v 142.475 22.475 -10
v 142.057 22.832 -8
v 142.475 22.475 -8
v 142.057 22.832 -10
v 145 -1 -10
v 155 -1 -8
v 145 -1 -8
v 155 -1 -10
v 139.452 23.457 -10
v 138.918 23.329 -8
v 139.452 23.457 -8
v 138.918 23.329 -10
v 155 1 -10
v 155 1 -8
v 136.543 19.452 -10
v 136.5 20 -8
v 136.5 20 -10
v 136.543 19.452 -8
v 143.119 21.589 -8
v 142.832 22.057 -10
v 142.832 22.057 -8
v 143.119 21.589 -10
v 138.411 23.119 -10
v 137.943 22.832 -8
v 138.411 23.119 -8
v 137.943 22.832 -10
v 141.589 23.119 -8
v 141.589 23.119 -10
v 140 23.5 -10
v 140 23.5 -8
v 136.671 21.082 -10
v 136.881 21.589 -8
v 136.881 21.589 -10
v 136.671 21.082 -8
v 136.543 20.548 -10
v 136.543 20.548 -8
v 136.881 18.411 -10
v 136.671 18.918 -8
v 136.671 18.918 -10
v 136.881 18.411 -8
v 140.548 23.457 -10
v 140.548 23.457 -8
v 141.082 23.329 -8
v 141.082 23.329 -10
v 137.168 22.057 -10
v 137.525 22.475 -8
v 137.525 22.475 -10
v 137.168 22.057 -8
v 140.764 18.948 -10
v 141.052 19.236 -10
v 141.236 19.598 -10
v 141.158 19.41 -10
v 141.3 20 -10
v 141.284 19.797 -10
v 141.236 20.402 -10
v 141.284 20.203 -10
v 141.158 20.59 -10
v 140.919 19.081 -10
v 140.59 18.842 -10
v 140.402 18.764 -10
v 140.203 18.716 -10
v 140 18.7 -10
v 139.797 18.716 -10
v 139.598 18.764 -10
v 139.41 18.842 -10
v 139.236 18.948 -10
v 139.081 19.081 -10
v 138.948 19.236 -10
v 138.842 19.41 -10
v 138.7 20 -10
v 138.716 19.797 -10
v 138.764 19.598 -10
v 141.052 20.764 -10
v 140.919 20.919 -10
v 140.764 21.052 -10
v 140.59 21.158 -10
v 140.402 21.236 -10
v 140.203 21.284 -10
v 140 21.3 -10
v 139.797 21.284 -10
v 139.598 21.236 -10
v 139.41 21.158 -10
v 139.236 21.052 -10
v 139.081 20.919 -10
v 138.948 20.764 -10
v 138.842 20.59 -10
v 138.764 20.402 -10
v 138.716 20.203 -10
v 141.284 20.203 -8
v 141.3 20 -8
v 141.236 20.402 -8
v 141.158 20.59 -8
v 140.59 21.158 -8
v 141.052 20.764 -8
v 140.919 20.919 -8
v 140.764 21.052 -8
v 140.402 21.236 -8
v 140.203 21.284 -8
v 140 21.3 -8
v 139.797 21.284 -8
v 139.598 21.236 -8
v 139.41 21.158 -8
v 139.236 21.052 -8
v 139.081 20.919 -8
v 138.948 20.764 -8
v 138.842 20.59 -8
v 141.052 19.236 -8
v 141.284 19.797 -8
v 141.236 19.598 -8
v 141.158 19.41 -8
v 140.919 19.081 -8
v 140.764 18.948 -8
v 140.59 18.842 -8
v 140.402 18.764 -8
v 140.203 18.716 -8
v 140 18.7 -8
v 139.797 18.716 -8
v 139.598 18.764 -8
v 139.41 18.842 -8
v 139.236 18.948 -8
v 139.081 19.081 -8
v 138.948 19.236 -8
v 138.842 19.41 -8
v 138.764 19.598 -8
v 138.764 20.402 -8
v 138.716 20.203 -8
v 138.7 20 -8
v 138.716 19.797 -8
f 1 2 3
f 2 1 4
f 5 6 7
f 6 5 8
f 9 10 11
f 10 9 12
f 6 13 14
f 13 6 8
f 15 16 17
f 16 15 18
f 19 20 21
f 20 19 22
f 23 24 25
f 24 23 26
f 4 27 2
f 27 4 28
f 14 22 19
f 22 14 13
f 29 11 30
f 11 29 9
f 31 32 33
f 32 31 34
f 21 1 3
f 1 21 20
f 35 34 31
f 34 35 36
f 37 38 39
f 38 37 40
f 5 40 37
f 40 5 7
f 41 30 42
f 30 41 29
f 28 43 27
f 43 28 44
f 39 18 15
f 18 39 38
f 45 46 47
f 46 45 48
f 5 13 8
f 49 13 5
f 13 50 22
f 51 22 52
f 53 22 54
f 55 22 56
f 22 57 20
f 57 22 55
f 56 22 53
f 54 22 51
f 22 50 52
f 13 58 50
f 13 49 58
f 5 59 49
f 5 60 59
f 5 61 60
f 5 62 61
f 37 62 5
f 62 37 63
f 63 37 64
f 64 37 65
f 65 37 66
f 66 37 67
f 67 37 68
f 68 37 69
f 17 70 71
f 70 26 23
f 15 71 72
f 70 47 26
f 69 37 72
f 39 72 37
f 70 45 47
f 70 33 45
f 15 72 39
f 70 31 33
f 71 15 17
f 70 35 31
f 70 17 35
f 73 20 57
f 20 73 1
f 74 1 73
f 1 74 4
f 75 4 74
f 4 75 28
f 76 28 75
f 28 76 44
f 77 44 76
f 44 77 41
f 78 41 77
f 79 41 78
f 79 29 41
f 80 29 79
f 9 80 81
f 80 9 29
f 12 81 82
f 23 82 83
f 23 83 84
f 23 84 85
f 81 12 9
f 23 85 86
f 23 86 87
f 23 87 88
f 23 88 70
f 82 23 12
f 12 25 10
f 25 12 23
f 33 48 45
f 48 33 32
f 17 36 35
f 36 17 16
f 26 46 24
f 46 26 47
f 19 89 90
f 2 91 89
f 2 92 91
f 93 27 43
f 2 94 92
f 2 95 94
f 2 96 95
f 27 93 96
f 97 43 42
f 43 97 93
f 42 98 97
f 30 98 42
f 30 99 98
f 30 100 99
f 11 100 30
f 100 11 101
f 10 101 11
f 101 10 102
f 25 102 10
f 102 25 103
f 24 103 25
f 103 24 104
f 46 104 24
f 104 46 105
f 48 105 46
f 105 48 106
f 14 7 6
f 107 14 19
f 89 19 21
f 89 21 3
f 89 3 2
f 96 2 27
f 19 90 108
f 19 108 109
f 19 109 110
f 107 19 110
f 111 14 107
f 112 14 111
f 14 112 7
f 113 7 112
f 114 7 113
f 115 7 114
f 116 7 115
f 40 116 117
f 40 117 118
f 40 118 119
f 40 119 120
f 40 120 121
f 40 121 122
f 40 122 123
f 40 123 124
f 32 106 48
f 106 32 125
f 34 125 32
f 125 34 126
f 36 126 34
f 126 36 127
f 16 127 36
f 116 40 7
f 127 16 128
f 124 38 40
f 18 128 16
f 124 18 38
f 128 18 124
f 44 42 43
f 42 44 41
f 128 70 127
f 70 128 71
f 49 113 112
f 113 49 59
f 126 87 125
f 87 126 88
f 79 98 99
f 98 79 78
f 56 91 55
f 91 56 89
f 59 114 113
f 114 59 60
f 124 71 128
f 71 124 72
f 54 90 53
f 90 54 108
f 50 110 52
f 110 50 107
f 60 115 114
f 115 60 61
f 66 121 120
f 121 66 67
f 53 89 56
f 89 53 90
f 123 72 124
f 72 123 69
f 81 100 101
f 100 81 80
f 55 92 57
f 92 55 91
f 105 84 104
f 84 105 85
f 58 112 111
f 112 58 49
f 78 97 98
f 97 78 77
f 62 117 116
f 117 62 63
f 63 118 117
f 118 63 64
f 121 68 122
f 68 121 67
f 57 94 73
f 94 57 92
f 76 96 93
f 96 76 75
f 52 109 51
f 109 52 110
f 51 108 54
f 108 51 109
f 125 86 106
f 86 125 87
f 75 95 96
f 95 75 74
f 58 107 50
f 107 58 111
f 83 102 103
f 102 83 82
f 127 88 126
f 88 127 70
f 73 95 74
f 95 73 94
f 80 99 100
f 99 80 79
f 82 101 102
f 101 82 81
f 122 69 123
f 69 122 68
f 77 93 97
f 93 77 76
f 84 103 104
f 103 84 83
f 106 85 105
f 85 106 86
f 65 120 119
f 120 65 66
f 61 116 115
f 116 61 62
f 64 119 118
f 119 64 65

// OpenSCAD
// file: ../lib/stdlib/naca4.scad
// Naca4.scad - library for parametric airfoils of 4 digit NACA series
// Code: Rudolf Huttary, Berlin
// June 2015
// commercial use prohibited


// general use: for more examples refer to sampler.scad
// naca = naca digits or 3el vector  (default = 12 or [0, 0, .12])
// L    = chord length [mm]      (default= 100)
// N    = # sample points        (default= 81)
// h    = height [mm]            (default= 1)
// open = close at the thin end? (default = true)
// two equivalent example calls
 airfoil(naca = 2408, L = 60, N=1001, h = 30, open = false);
// airfoil(naca = [.2, .4, .32], L = 60, N=1001, h = 30, open = false);

module help()
{
  echo(str("\n\nList of signatures in lib:\n=================\n",
  "module airfoil(naca=2412, L = 100, N = 81, h = 1, open = false) - renders airfoil object\n",
  "module airfoil(naca=[.2, .4, .12], L = 100, N = 81, h = 1, open = false) - renders airfoil object using percentage for camber,  camber distance and thicknes\n",
  "function airfoil_data(naca=12, L = 100, N = 81, open = false)\n",
  "=================\n"));
}

help();
// this is the object
module airfoil(naca=12, L = 100, N = 81, h = 1, open = false)
{
  linear_extrude(height = h)
  polygon(points = airfoil_data(naca, L, N, open));
}

module hollow_airfoil(naca=12, L = 100, N = 81, h = 1, open = false, wall_thickness = 1)
{
    if (open){
        linear_extrude(height = h)

        if (wall_thickness>0){
            difference(){
                polygon(points = airfoil_data(naca, L, N, false));
                offset(delta = - wall_thickness, chamfer = false) polygon(points = airfoil_data(naca, L, N, open = false));
            }
        }
        else{
            difference(){
                offset(delta = - wall_thickness, chamfer = false) polygon(points = airfoil_data(naca, L, N, open = false));
                polygon(points = airfoil_data(naca, L, N, false));
            }
        }
    }
    else{

        linear_extrude(height = abs(wall_thickness))
            polygon(points = airfoil_data(naca, L, N, false));

        linear_extrude(height = h)
            difference(){
                polygon(points = airfoil_data(naca, L, N, open));
                offset(delta = - wall_thickness) polygon(points = airfoil_data(naca, L, N, open = false));
            }

        translate([0,0, h - wall_thickness])
            linear_extrude(height = abs(wall_thickness))
                polygon(points = airfoil_data(naca, L, N, false));

    }
}


// this is the main function providing the airfoil data
function airfoil_data(naca=12, L = 100, N = 81, open = false) =
  let(Na = len(str(naca))!=3?NACA(naca):naca)
  let(A = [.2969, -0.126, -.3516, .2843, open?-0.1015:-0.1036])
  [for (b=[-180:360/(N):179.99])
    let (x = (1-cos(b))/2)
    let(yt = sign(b)*Na[2]/.2*(A*[sqrt(x), x, x*x, x*x*x, x*x*x*x]))
    Na[0]==0?L*[x, yt]:L*camber(x, yt, Na[0], Na[1], sign(b))];


function trailing_edge_angle(naca=12, open = false) =
  let(Na = len(str(naca))!=3?NACA(naca):naca)
  let(A = [.2969, -0.126, -.3516, .2843, open?-0.1015:-0.1036])
  let (x =0.999)  // set x near to airfoil trailing edge
  let(yt = Na[2]/.2*(A*[sqrt(x), x, x*x, x*x*x, x*x*x*x])) // calculate distance from x-axis at previously set position
  atan2(yt,1-x);  // calculate angle of triangle between end of airfoil. The triange height corresponds to previously calculated distance from x-axis

function surface_angle(x = 0.5, naca=12, open = false) =
  let(Na = len(str(naca))!=3?NACA(naca):naca)
  let(A = [0.2969, -0.126, -0.3516, 0.2843, open?-0.1015:-0.1036])
  let(dy = Na[2]/0.2*(A*[(1/2)*(1/sqrt(x)), 1, 2*x, 3*x*x, 4*x*x*x])) // calculate derivative of airfoil function at the x point
  atan(dy);  // calculate  the angle from function derivative

function surface_distance(x = 0.5, naca=12, open = false) =
  let(Na = len(str(naca))!=3?NACA(naca):naca)
  let(A = [0.2969, -0.126, -0.3516, 0.2843, open?-0.1015:-0.1036])
  Na[2]/.2*(A*[sqrt(x), x, x*x, x*x*x, x*x*x*x]); // calculate distance from x-axis at previously set position

// helper functions
function NACA(naca) =
  let (M = floor(naca/1000))
  let (P = floor((naca-M*1000)/100))
  [M/100, P/10, floor(naca-M*1000-P*100)/100];

function camber(x, y, M, P, upper) =
  let(yc = (x<P)?M/P/P*(2*P*x-x*x): M/(1-P)/(1-P)*(1 - 2*P + 2*P*x -x*x))
  let(dy = (x<P)?2*M/P/P*(P-x):2*M/(1-P)/(1-P)*(P-x))
  let(th = atan(dy))
  [upper ? x - y*sin(th):x + y*sin(th), upper ? yc + y*cos(th):yc - y*cos(th)];
// file: ../lib/stdlib/sweep.scad
// Naca4_sweep.scad - sweep library
// Code: Rudolf Huttary, Berlin
// 1st release : June 2015
// last update: 2017.02.10
// commercial use prohibited

use <naca4.scad>

//example1();
//rotate([80, 180, 130])
example();

// sweep from NACA1480 to NACA6480 (len = 230 mm, winding y,z = 80°
// sweeps generates a single polyhedron from multiple datasets
module example()
{
  N = 40;
  sweep(gen_dat(M=5, dz=1,N=N), showslices = false);
//  sweep(gen_dat(N=5, dz=1,N=N), showslices = true);

  // specific generator function
  function gen_dat(M=10,dz=.1,N=10) = [for (i=[1:dz:M])
    let( L = length(i))
    let( af = vec3D(
        airfoil_data([.1,.5,thickness(i)], L=length(i), N = N)))
    T_(-L/2, 0, (i+1)*2, af)];  // translate airfoil

  function thickness(i) = .5*sin(i*i)+.1;
  function length(i) = (60+sin(12*(i-3))*30);
}

module help()
{
  echo(str("\n\nNaca4_sweep library by Rudolf Huttary\n",
  "List of signatures in lib:\n=================\n",
  "sweep(dat, convexity = 5, showslices = false, close = false)  // dat - vec of vec2, with vec1 = airfoil_data\n",
  "function vec3D(v, z=0)  // expand vec2 to vec3",
  "function rot(w=0, p) // rotate vec2",
  "function T_(x=0, y=0, z=0, v) // translates vec of vec3\n",
  "function R_(x=0, y=0, z=0, v) // rotates vec of vec3\n",
  "function Rx_(x=0, v) // x-rotates vec of vec3\n",
  "function Ry_(y=0, v) // y-rotates vec of vec3\n",
  "function Rz_(z=0, v) // z-rotates vec of vec3\n",
  "function T_(x=0, y=0, z=0, v) // translates vec of vec3\n",
  "function Tx_(x=0, v) // x-translates vec of vec3\n",
  "function Ry_(y=0, v) // y-translates vec of vec3\n",
  "function Rz_(z=0, v) // z-translates vec of vec3\n",
  "function S_(x=0, y=0, z=0, v) // scales vec of vec3\n",
  "function Sx_(x=0, v) // x-translates vec of vec3\n",
  "function Sy_(x=0, v) // y-translates vec of vec3\n",
  "function Sz_(x=0, v) // z-translates vec of vec3\n",
  "=================\n"));
}


// generate polyhedron from multiple airfoil_datasets
// dat - vec of vec1, with vec1 = simple polygon like airfoil_data, > 3 points per dataset expected
// use "planar_caps = false" only for non-planar cap faces with cord line symmetry
module sweep(dat, convexity = 5, showslices = false, close = false, planar_caps = false)
{
  n = len(dat);     // # datasets
  l = len(dat[0]);  // points per dataset
  if(l<=3) echo("ERROR: sweep() expects more than 3 points per dataset");
  if (showslices)
    for(i=[0:n-1]) polyhedron(points = dat[i], faces = [count(l-1, 0)]);
  else
  {
    obj = sweep_(dat, close=close, planar_caps=planar_caps);
    polyhedron(obj[0], obj[1], convexity = 5);
  }
}
  function count(a, b) = [for (i=[a:(a<b?1:-1):b]) i];

function sweep_(dat, close = false, planar_caps = true) =
  let(n=len(dat), l=len(dat[0]))
  let(first = planar_caps?[count(l-1, 0)]:
            faces_polygon(l, true))  // indices first face
  let(last = planar_caps?[count((n-1)*l,(n)*l-1)]:
            faces_shift((n-2)*l, faces_polygon(l, false))) // indices last face
  let(faces = close?faces_sweep(l,n, close) :concat(first, last, faces_sweep(l,n)))
  let(points = [for (i=[0:n-1], j=[0:l-1]) dat[i][j]]) // flatten points vector
    [points, faces];

function faces_shift(d, dat) = [for (i=[0:len(dat)-1]) dat[i] + [d, d, d]];


function del(A, n) = [for(i=[0:len(A)-1]) if (n!=i)A[i]];

//// knitting for polyhedron
  function faces_sweep(l, n=1, close = false) =
      let(M = n*l, n1=close?n+1:n)
      concat([[0,l,l-1]],   // first face
             [for (i=[0:l*(n1-1)-2], j = [0,1])
                j==0? [i, i+1, (i+l)%M]
                    : [i+1, (i+l+1)%M, (i+l)%M]
             ]
             ,[[(n1*l-1)%M, (n1-1)*l-1, ((n1-1)*l)%M]
             ]); // last face
      ;

  function faces_polygon(l, first = true) = let(odd = (l%2==1), d=first?0:l)
    let(res = odd?concat([[d,d+1,d+l-1]],
      [for (i=[1:(l-3)/2], j=[0,1])(j==0)?[d+i,d+i+1,d+l-i]:[d+i+1,d+l-i-1, d+l-i]]):
      [for (i=[0:(l-4)/2], j=[0,1])(j==0)?[d+i,d+i+1,d+l-i-1]:[d+i+1,d+l-i-2, d+l-i-1]])
    first?facerev(res):res;

  function facerev(dat) = [for (i=[0:len(dat)-1]) [dat[i][0],dat[i][2],dat[i][1]]];



//// vector and vector set operation stuff ///////////////////////
//// Expand 2D vector into 3D
function vec3D(v, z=0) = [for(i = [0:len(v)-1])
  len(v[i])==2?[v[i][0], v[i][1], z]:v[i]+[0, 0, z]];

// Translation - 1D, 2D, 3D point vector //////////////////////////
// vector along all axes
function T_(x=0, y=0, z=0, v) = let(x_ = (len(x)==3)?x:[x, y, z])
  [for (i=[0:len(v)-1]) T__(x_[0], x_[1], x_[2], p=v[i])];
/// vector along one axis
function Tx_(x=0, v) = T_(x=x, v=v);
function Ty_(y=0, v) = T_(y=y, v=v);
function Tz_(z=0, v) = T_(z=z, v=v);
/// point along all axes 1D, 2D, 3D allowed
function T__(x=0, y=0, z=0, p) = len(p)==3?p+[x, y, z]:len(p)==2?p+[x, y]:p+x;

//// Rotation - 2D, 3D point vector ///////////////////////////////////
// vector around all axes
function R_(x=0, y=0, z=0, v) =             // 2D vectors allowed
  let(x_ = (len(x)==3)?x:[x, y, z])
  len(v[0])==3?Rz_(x_[2], Ry_(x_[1], Rx_(x_[0], v))):
  [for(i = [0:len(v)-1]) rot(x_[2], v[i])];
// vector around one axis
function Rx_(w, A) = A*[[1, 0, 0], [0, cos(w), sin(w)], [0, -sin(w), cos(w)]];
function Ry_(w, A) = A*[[cos(w), 0, sin(w)], [0, 1, 0], [-sin(w), 0, cos(w)]];
function Rz_(w, A) = A*[[cos(w), sin(w), 0], [-sin(w), cos(w), 0], [0, 0, 1]];


//// Scale - 2D, 3D point vector ///////////////////////////////////
// vector along all axes
function S_(x=1, y=1, z=1, v) =
  [for (i=[0:len(v)-1]) S__(x,y,z, v[i])];
// vector along one axis
function Sx_(x=0, v) = S_(x=x, v=v);
function Sy_(y=0, v) = S_(y=y, v=v);
function Sz_(z=0, v) = S_(z=z, v=v);
// single point in 2D
function S__(x=1, y=1, z=1, p) =
  len(p)==3?[p[0]*x, p[1]*y, p[2]*z]:len(p)==2?[p[0]*x+p[1]*y]:[p[0]*x];
// file: ../888_3004.scad
include<../parameters.scad>

include<lib/stdlib/sweep.scad>

height = 150;
height_bottom_part = 130;
depth_max = 200;

below_height = 30;
rudder_depth = 60;

N = 80;

module tail_vertical(){

    sweep(gen_dat(M=height, dz=1,N=N), showslices = false);

    // specific generator function
    function gen_dat(M=10,dz=0.1,N=10) = [for (i=[0:dz:M/2])
      let( L = extra_length(i))
      let( af = vec3D(
          airfoil_data([0,0,0.05+thickness(i)], L=extra_length(i), N = N)))
      T_(edge_shift(i), 0, (i)*2, af)];  // translate airfoil

    function edge_shift(i) = (i/60)^(22)+i*0.75;
    function thickness(i) = 0.0001;   //0.5*sin(i*i)+.1;
    function extra_length(i) = depth_max - edge_shift(i);
}


rudder_below = 10;
module tail_rudder() translate([0, 0, -rudder_below]){
    difference(){
        intersection(){
            tail_vertical();

        // space for rudder
            hull(){
                translate([depth_max - rudder_depth+10, -10, 0])
                    cube([rudder_depth - 10-3, 20, height_bottom_part+rudder_below-.5]);
                translate([depth_max - rudder_depth, 0, 0])
                    cylinder(d = 12-2, h = height_bottom_part+rudder_below-0.5, $fn=60);
            }
        }
        translate([depth_max - rudder_depth, 0, -0.5])
            cylinder(d = 2.6, h = height_bottom_part+rudder_below+1, $fn = 60);
    }

    translate([depth_max - rudder_depth, 0, 0]) difference(){
        hull(){
            translate([10, 0, 1]) cube([10, 2, 2], center = true);
            translate([0, 20, 0]) cylinder(d = 7, h=2, $fn=40);
        }
        translate([0, 20, 0]) cylinder(d = 2.6, h=2, $fn=40);
    }
    /* difference(){
        union(){
            translate([30, 0, 5-0.5])
                cube([15-1, 5-1, 10], center=true);
            translate([30+80, 0, 5-0.5])
                cube([15-1, 5-1, 10], center=true);
        }
        translate([30, 0, 5])
            rotate([90, 0, 0])
                cylinder(d=M3_screw_diameter, h=50, center=true, $fn = 30);
        translate([30+80, 0, 5])
            rotate([90, 0, 0])
                cylinder(d=M3_screw_diameter, h=50, center=true, $fn = 30);
    } */
}
tail_rudder();

module 888_3004() tail_rudder();

module 888_3004_modif_pipe(){
        translate([depth_max - rudder_depth, 0, -0.5-rudder_below])
            cylinder(d = 3.4, h = height_bottom_part+rudder_below+1, $fn = 60);

}

%888_3004_modif_pipe();


module 888_3004_modif_hand(){
    translate([depth_max - rudder_depth, 0, -rudder_below]) hull(){
        translate([10, 0, 1]) cube([10, 2, 2], center = true);
        translate([0, 20, 0]) cylinder(d = 7, h=2, $fn=40);
    }
}

% 888_3004_modif_hand();
// file: ../../parameters.scad
global_clearance = 0.5;

layer_thickness = 0.3;

//Main tube diameter - hole [mm]
main_tube_outer_diameter = 25.4;
main_tube_inner_diameter = 23.05;

// Nastavení parametrů rotoru

gliding_aggle = 14;         // tenhle úhel by se zřejmě v budoucnu měl počítat z požadované klouzavosti.

rotor_blade_AOA = 1.5;      // nastavení úhlu náběhu rotorového listu

// Rotor Auto-G2
rotor_blade_rod = true;  // generovat diru pro uhlikove tycky
rotor_blade_length = 400 - 15;   // délka rotorového listu
rotor_blade_depth = 45.5;     // hloubka rotorového listu


blade_mount_length = 30;

blade_mount_width = 17;
blade_mount_thickness = 4.6;
blade_mount_screw_offset = 5; // distance of first screw from rotor end

// Testovaci maly rotor

        /*
        rotor_blade_rod = false;
        rotor_blade_length = 145;   // délka rotorového listu
        rotor_blade_depth = 45.5 * (145/385);     // hloubka rotorového listu
        blade_mount_length = 20;
        blade_mount_width = 10;
        blade_mount_thickness = 4;
        */

// konec parametru pro testovaci maly rotor

rotor_height = 180;         // výška otočného kloubu rotoru nad hlavní trubkou vírníku (odhad)
rotor_blades_count = 2;
rotor_delta_angle = 12;
rotor_blade_thickness = 5.1;

rotor_blade_naca = 2412;
rotor_blade_parts_count = 3;

blade_transition_length = 10; // length of blade transition

blade_mount_screw_distance = (16.47+11.86)/2;

/* blade_shell_thickness = 0.4;
blade_shell_thickness_inner = 0.4;
blade_shell_thickness_wire = 0.4;
blade_infill_distance = 25;
blade_infill_overlap = 0; */

/// Nastaveni pro Slic3r
blade_shell_thickness = 0.45;
blade_shell_thickness_inner = 0.43;
blade_shell_thickness_wire = 0.45;
blade_infill_distance = 20;
blade_infill_overlap = 0;


//blade_rod_position = [rotor_blade_depth/4 + 5, 0, 0];
//blade_rod_position2 = [rotor_blade_depth/4 - 5, 0, 0];

//blade_rod_position = [15, 0, 0];
//blade_rod_position2 = [4, 0.3, 0];

blade_rod1_diameter = 2.58;
blade_rod2_diameter = 2.58;
blade_rod3_diameter = 2.13;

blade_rod1_position = [3.4, 0.3, 0];
blade_rod2_position = [rotor_blade_depth/4 - 4, 0.2, 0];
blade_rod3_position = [rotor_blade_depth/4 + 3.5, 0, 0];


rotor_head_width =  30;    //Rozměr 1 v nákresu
pilon_wall_thickness = 4.2;  // Rozměr 2 v nákresu
horizontal_screw_distance = 14.5;   // Rozměr 4 v nákresu
vertical_screw_distance = 12;       // rozměr 5 v nkresu
topscrew_distance_endofpilon = 5;

rotorhead_wall_thickness = 3; // sila tistenych dilu


bearing_outer_diameter = 10.2;    // Rozměr B1 v nákresu s přídavkem na toleranci otvoru
bearing_thickness = 4;        // Rozměr B2 v nákresu
//bearing_shaft_length = 19.5;    // Rozměr B3 v nákresu, Originalni hodnota 19.5
bearing_shaft_length = 20;    // Rozměr B3 v nákresu


// nastavení parametrů motoru

engine_angle = -8;
engine_diameter = 55;
engine_offset = 55;

engine_screws_radius = 15;
engine_holes_radius = (24 + 44)/4;
engine_shatf_hole_diameter = 13;

// screw length step - minimum difference in length between two types of screws
basic_screw_length = 5;

//Screw diameter and nut for M6 [mm]
M6_screw_diameter=6.5;
M6_head_diameter = 10+0.5;
M6_head_height = 6;
M6_nut_height = 4.9;
M6_nut_diameter = 11.8;
M6_nut_pocket = 10.4;

//Screw diameter and nut for M5 [mm]
M5_screw_diameter=5.5;
M5_head_height = 5;
M5_head_diameter = 13+0.5;
M5_nut_height = 4.5;
M5_nut_diameter = 9.4;
M5_nut_pocket = 8.4;

//Screw diameter and nut for M4 [mm]
M4_screw_diameter=4.5;
M4_screw_head_height = 4;
M4_nut_height = 3.2;
M4_nut_diameter = 8.4;
M4_nut_pocket = 7.5;

//Screw diameter and nut for M3 [mm]
M3_screw_diameter = 3.2;
M3_nut_height = 2.7;
M3_nut_diameter = 6.6;
M3_screw_head_height = 3;
M3_nut_pocket = 5.6;


//Screw diameter and nut for M2,5 [mm]
M2_5_screw_diameter = 2.7;
M2_5_nut_height = 2.3;
M2_5_nut_diameter = 6;
M2_5_nut_pocket = 5.1;

//Screw diameter and nut for M2 [mm]
M2_screw_diameter = 2.0;
M2_nut_height = 1.8;
M2_nut_diameter = 4.8;
M2_nut_pocket = 3.95;


blade_mount_screw = M2_screw_diameter;
blade_mount_nut = M2_nut_diameter;


//šroub servo
Servo_screw = 1.5;
Servo_nut_height = 1;
Servo_nut_diameter = 2.7;

tail_pipes_distance = 10.16*5;
tail_pipes_diameter = M4_screw_diameter;
tail_pipes_min_wall = 3;

elevator_pitch = 2;

//center_of_gravity_position = [main_pilon_position - tan(gliding_aggle)*rotor_height, 0, 0];


base_patern = 10.16;
////podzvozek

radius_undercarriage = 25;
vzdalenost_x = tan(20) * 131;
vzdalenost_y = (131 - radius_undercarriage)/tan(79);
uhel_y = 90 - 20;
uhel_x = 90 - 79;

maximum_printable_size = 150;


////Pitotova trubice
Pitot_tube_diameter = 4.02 + 1;
Distance_hole_from_tube = 11.92;  //vzdálenost otvoru pro připevnění od samotné trubičky


////Vlečné zařízení
tow_ring_diameter = 20;
tow_ring_thickness = 5;
tow_ring_groove = 2;
tow_ring_hole_diameter = M3_screw_diameter;

////Simoniny parametry pro nosník rotoru
base_length = 290; //delka podlozky
base_split_position = [0, base_length/2, base_length];
base_width = 70; //sirka podlozky - vnější šířka nosníku
base_thickness = 4; //vyska podlozky
base_patern = 10;
rantl_thickness = 4; //sirka steny podlozky
rantl_height = 8;
niy=4; //pocet der podelne


// Drazak motoru

motor_holder_height = base_patern * 5;
motor_holder_thickness = 4;
motor_holder_motor_height = 25;
motor_holder_side_mount_height = base_patern*2.5;
pilon_holder_side_mount_height = base_patern*4;


// Paraetry pilonu


// pilon_height = 250 - pilon_holder_side_mount_height;
pilon_height = 180 - pilon_holder_side_mount_height;
pilot_height_separation = 120 - pilon_holder_side_mount_height;
pilon_thickness = 3;
pilon_beam_width = 10;
pilon_base_length = 60;
pilon_ring_length = 40;
pilon_ring_thickness = 3;

pilon_top_width = 20;
pilon_top_length = 20;

pilon_ring_width = 45;
pilon_ring_height_rantl = 12+0.5;
pilon_ring_height = 3;

pilon_angle = atan2(pilon_height,(base_width-pilon_top_width)/2);
echo(pilon_angle);

pilon_bottom_angle = atan2(pilot_height_separation,(base_width-pilon_ring_width)/2-pilon_thickness*1.5);
echo(pilon_bottom_angle);
pilon_top_angle = atan2(pilon_height - pilot_height_separation,(pilon_ring_width - rotor_head_width)/2 - pilon_thickness - pilon_ring_thickness);
echo(pilon_top_angle);
// main file
//@set_slicing_config(../../slicing/tail.ini)

//@set_modificator(888_3004_modif_a)
//@set_slicing_config(../../slicing/default.ini, 888_3004_modif_a)

//@set_modificator(888_3004_modif_b)
//@set_slicing_config(../../slicing/tail_center.ini, 888_3004_modif_b)

//dil pro pripevneni tazneho motoru
include <../../parameters.scad>
use <../888_3004.scad>

888_3004();


module 888_3004_modif_a() 888_3004_modif_hand();
module 888_3004_modif_b() 888_3004_modif_pipe();
